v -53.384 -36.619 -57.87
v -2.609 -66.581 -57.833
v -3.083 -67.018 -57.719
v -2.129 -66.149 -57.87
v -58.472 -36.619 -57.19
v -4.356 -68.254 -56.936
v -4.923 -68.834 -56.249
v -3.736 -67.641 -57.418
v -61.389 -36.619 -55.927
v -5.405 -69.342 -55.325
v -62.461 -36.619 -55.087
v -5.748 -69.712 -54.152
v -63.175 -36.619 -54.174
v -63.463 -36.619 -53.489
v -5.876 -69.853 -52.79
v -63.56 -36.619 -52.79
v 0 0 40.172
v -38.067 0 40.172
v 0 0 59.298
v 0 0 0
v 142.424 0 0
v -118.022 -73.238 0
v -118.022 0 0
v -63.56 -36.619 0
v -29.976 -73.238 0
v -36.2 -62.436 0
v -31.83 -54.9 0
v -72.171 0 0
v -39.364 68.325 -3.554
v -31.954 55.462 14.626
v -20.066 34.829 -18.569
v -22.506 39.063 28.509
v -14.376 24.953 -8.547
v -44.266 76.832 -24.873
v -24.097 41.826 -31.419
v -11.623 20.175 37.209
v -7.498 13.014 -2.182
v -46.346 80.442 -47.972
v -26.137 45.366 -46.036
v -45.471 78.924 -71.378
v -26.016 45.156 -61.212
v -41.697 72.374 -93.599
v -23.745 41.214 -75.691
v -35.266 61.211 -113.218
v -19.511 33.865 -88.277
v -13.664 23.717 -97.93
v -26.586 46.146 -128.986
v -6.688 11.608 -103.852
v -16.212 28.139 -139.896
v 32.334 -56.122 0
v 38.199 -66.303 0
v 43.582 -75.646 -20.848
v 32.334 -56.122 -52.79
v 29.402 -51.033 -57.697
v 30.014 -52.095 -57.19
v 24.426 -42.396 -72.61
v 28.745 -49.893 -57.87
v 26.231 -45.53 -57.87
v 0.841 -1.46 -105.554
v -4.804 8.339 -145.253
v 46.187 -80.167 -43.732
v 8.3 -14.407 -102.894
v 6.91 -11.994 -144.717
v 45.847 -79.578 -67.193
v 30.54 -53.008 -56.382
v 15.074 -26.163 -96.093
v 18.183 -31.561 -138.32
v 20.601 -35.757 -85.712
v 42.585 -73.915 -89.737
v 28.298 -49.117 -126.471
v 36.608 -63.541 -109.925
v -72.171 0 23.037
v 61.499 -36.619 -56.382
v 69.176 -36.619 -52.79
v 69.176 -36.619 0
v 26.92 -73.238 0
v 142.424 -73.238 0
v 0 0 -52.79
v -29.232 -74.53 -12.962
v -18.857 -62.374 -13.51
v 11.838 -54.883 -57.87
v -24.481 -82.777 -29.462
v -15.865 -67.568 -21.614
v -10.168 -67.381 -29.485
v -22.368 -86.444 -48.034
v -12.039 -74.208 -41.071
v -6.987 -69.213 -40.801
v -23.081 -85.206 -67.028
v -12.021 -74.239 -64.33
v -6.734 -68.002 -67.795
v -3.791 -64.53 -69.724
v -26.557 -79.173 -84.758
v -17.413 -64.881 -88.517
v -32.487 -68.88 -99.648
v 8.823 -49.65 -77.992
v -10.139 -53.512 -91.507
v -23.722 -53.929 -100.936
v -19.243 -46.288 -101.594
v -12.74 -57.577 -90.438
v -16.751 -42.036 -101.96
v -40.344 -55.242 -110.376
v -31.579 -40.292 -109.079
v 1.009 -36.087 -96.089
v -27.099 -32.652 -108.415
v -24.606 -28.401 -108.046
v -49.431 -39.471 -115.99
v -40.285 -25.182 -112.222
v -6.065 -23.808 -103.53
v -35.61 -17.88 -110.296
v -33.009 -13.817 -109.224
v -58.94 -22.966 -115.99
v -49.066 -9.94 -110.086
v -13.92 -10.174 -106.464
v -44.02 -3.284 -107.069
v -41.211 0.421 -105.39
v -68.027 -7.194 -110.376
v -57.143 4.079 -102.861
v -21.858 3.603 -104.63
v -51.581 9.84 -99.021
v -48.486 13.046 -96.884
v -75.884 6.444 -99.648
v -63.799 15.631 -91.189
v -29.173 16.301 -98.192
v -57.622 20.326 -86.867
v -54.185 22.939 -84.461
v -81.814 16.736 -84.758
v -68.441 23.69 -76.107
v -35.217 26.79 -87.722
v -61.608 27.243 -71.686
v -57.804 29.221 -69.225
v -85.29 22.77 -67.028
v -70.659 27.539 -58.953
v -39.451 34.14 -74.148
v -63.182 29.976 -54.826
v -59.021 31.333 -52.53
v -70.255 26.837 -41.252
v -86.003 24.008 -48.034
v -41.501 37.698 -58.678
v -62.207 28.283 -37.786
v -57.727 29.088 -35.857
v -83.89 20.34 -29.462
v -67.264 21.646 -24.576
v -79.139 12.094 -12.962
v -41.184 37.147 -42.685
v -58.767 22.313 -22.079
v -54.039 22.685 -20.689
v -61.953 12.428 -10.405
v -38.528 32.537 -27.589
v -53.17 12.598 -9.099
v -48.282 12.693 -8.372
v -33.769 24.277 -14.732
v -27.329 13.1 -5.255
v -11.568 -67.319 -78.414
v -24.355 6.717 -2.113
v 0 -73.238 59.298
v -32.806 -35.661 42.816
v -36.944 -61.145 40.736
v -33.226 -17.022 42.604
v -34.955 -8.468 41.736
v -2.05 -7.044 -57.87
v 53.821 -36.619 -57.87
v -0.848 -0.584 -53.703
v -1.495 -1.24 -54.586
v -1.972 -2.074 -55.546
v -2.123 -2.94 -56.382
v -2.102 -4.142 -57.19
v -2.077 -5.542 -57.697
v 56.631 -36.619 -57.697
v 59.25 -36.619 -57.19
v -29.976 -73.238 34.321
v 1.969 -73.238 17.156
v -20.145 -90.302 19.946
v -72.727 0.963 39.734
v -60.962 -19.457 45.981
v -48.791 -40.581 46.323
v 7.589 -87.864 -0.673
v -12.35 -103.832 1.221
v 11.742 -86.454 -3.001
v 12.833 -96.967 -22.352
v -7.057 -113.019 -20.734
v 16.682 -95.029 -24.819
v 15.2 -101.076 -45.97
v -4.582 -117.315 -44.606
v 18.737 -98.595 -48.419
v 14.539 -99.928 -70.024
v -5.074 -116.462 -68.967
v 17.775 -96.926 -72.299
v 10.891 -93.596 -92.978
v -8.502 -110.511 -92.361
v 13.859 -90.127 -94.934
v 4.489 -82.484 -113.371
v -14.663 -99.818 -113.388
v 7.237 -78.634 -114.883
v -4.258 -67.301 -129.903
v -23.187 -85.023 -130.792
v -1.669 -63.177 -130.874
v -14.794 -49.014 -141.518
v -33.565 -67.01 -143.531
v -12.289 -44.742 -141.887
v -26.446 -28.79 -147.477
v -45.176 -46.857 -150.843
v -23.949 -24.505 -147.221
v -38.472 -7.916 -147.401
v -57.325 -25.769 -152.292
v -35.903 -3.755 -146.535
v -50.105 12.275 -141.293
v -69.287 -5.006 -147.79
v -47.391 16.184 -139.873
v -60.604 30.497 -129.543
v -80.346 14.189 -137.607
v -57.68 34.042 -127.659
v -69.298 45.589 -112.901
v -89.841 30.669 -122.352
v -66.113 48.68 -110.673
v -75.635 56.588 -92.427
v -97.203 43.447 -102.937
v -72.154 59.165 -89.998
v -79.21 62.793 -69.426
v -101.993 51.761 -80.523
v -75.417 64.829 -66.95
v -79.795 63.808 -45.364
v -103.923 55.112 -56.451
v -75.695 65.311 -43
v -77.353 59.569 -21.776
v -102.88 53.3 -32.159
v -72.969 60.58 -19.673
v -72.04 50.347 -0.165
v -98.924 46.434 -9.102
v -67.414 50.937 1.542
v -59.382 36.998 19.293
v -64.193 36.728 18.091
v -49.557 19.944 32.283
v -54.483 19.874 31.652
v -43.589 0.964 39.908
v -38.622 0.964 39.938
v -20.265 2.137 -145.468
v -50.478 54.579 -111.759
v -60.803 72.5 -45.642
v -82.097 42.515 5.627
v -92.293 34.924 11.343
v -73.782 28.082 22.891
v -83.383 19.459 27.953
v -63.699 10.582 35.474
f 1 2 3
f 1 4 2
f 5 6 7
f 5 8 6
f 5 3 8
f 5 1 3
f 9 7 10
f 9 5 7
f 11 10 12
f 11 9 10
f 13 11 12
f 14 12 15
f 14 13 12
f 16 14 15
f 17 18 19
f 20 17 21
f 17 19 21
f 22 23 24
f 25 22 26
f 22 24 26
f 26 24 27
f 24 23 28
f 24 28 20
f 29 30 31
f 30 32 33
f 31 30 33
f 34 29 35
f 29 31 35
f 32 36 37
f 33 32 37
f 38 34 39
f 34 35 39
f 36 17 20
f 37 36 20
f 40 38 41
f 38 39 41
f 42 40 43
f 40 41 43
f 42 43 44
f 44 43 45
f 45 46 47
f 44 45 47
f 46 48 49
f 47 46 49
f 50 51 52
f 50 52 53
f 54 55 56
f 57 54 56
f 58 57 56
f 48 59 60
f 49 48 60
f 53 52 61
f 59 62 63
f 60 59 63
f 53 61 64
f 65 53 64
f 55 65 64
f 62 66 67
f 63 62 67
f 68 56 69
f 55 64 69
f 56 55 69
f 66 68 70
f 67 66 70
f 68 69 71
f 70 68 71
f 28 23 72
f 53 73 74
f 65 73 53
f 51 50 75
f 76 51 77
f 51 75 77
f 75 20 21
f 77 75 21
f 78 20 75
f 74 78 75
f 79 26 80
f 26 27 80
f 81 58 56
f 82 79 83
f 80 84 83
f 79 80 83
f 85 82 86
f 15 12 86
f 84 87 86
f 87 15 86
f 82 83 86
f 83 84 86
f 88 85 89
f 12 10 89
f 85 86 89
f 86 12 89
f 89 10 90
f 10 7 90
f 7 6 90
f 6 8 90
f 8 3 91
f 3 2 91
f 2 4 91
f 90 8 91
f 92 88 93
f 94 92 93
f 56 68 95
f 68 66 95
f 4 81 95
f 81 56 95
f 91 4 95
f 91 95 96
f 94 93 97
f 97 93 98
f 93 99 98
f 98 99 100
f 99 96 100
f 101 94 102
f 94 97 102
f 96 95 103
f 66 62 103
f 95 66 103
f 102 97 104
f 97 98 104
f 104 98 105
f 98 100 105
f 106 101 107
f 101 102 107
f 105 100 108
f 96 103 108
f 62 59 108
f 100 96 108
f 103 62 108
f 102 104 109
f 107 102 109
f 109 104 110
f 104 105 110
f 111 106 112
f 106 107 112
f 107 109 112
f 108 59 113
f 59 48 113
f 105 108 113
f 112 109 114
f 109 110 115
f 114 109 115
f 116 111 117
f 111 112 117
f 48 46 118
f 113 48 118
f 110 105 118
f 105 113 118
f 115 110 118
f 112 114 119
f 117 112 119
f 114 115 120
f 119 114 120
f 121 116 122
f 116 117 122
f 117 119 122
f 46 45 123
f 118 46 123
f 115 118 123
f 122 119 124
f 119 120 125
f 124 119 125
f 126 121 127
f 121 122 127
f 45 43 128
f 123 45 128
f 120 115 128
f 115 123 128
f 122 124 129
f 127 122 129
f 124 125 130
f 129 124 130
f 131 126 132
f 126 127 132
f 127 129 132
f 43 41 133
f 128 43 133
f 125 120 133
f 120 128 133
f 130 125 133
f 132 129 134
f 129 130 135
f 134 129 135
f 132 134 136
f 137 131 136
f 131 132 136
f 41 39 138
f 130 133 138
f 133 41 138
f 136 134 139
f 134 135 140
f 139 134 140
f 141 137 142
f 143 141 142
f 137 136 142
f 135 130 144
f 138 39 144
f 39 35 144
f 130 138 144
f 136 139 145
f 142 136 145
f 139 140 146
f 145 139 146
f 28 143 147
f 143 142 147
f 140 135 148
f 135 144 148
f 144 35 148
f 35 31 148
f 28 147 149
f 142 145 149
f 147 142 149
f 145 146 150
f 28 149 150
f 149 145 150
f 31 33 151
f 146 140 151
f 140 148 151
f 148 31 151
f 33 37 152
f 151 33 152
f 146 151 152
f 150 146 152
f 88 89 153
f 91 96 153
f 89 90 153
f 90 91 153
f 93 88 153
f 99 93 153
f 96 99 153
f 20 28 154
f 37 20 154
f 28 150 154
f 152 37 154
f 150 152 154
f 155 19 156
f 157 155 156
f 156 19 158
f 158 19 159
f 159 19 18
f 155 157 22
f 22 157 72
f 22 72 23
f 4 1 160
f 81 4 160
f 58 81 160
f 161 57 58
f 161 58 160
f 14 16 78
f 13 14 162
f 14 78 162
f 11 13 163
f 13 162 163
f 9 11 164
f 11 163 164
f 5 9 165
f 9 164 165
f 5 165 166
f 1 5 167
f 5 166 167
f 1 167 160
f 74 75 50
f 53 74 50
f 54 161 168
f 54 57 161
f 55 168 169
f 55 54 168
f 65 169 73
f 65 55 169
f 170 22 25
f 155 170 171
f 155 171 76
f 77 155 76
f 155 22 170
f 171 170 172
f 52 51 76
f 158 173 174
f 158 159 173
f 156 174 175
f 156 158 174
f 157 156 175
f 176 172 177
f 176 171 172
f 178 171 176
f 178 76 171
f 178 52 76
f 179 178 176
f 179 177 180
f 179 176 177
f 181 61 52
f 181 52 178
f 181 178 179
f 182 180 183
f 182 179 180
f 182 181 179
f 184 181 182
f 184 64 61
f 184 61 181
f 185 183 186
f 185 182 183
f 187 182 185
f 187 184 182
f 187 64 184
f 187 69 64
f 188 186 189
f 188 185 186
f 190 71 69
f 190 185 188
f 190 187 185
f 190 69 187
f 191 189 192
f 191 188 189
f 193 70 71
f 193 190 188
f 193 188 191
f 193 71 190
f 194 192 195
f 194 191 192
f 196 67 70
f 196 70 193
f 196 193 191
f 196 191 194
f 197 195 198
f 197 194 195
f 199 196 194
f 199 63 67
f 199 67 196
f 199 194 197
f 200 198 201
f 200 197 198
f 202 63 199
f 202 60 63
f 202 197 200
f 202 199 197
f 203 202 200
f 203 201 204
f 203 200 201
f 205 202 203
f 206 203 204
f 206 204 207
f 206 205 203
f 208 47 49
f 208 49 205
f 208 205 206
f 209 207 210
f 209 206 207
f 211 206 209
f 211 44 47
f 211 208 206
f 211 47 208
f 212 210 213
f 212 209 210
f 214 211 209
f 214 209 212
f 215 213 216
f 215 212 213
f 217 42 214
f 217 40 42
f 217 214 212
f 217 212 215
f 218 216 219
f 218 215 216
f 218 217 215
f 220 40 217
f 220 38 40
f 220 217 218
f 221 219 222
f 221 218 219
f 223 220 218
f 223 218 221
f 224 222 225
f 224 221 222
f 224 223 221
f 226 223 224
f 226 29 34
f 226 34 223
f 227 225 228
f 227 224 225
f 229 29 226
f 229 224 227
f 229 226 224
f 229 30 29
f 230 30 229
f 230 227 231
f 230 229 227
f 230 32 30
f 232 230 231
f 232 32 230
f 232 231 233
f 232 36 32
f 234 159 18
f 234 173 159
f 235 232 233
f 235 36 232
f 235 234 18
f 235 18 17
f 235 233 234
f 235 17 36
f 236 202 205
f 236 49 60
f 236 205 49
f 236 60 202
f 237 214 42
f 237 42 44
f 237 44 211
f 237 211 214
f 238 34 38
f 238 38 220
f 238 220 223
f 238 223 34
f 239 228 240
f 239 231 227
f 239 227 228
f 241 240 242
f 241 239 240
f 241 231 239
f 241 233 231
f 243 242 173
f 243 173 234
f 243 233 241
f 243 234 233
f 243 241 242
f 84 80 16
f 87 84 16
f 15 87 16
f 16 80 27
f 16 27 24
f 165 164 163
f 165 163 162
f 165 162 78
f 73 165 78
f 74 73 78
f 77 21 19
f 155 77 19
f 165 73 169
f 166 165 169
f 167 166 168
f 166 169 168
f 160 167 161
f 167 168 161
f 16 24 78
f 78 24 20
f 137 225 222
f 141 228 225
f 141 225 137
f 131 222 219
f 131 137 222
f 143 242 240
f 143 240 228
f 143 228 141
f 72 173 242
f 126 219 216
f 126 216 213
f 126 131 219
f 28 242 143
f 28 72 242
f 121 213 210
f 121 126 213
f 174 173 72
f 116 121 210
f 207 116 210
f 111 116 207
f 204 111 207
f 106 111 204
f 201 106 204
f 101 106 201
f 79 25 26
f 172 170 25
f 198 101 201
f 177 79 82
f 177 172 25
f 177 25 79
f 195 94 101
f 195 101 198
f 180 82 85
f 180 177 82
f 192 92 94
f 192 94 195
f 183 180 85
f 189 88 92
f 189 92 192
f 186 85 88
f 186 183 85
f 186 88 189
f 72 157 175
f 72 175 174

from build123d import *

# Parameters (mm, degrees)
F1_DEPTH = 73.23845
F3_DEPTH = 57.87031
F4_SIZE  = 5.08
F5_R     = 5.07999
F6_W     = 72.171472013
F6_H     = 40.1722677052


# Not quite as in the source:
# - a fillet or chamfer is up to 0.001 mm smaller than in the source, because OpenCascade refuses the exact size


with BuildPart() as f1:
    # F0 (on Front) → F1 (new body)
    with BuildSketch(Plane.XZ):
        Polygon((0, 59.2983625829), (-118.0220618844, 0), (142.4238681793, 0), align=None)
    extrude(amount=F1_DEPTH)

    # F2 (on face) → F3 (join)
    with BuildSketch(Plane(origin=(0, 0, 0), x_dir=(1, 0, 0), z_dir=(0, 0, -1))):
        Polygon((69.1764354706, 36.619225), (0, 73.23845), (0, 0), align=None)
        Polygon((0, 0), (0, 73.23845), (-63.5601058602, 36.619225), align=None)
    extrude(amount=F3_DEPTH)

    # F4
    f4_edges = [f1.edges().sort_by_distance(p)[0] for p in [
        (34.588218, -18.309613, -57.87031),
        (34.588218, -54.928838, -57.87031),
    ]]
    chamfer(f4_edges, length=F4_SIZE)

    # F5 (radius 5.08 in the source; OpenCascade refuses exactly that, so slightly less here)
    f5_edges = [f1.edges().sort_by_distance(p)[0] for p in [
        (-34.37973, -53.431071, -57.87031),
        (-34.37973, -19.807379, -57.87031),
        (26.559471, -19.807379, -57.87031),
        (26.559471, -53.431071, -57.87031),
    ]]
    fillet(f5_edges, radius=F5_R)

    # F6 (on Front) → F7 (revolve)
    with BuildSketch(Plane.XZ):
        with Locations((-36.0857360065, 20.0861338526)):
            Rectangle(F6_W, F6_H)
    revolve(axis=Axis((-31.7800580476, -18.3096154484, -52.79032), (0.8664808713, 0.4992102759, 0)))


solid = f1.part
